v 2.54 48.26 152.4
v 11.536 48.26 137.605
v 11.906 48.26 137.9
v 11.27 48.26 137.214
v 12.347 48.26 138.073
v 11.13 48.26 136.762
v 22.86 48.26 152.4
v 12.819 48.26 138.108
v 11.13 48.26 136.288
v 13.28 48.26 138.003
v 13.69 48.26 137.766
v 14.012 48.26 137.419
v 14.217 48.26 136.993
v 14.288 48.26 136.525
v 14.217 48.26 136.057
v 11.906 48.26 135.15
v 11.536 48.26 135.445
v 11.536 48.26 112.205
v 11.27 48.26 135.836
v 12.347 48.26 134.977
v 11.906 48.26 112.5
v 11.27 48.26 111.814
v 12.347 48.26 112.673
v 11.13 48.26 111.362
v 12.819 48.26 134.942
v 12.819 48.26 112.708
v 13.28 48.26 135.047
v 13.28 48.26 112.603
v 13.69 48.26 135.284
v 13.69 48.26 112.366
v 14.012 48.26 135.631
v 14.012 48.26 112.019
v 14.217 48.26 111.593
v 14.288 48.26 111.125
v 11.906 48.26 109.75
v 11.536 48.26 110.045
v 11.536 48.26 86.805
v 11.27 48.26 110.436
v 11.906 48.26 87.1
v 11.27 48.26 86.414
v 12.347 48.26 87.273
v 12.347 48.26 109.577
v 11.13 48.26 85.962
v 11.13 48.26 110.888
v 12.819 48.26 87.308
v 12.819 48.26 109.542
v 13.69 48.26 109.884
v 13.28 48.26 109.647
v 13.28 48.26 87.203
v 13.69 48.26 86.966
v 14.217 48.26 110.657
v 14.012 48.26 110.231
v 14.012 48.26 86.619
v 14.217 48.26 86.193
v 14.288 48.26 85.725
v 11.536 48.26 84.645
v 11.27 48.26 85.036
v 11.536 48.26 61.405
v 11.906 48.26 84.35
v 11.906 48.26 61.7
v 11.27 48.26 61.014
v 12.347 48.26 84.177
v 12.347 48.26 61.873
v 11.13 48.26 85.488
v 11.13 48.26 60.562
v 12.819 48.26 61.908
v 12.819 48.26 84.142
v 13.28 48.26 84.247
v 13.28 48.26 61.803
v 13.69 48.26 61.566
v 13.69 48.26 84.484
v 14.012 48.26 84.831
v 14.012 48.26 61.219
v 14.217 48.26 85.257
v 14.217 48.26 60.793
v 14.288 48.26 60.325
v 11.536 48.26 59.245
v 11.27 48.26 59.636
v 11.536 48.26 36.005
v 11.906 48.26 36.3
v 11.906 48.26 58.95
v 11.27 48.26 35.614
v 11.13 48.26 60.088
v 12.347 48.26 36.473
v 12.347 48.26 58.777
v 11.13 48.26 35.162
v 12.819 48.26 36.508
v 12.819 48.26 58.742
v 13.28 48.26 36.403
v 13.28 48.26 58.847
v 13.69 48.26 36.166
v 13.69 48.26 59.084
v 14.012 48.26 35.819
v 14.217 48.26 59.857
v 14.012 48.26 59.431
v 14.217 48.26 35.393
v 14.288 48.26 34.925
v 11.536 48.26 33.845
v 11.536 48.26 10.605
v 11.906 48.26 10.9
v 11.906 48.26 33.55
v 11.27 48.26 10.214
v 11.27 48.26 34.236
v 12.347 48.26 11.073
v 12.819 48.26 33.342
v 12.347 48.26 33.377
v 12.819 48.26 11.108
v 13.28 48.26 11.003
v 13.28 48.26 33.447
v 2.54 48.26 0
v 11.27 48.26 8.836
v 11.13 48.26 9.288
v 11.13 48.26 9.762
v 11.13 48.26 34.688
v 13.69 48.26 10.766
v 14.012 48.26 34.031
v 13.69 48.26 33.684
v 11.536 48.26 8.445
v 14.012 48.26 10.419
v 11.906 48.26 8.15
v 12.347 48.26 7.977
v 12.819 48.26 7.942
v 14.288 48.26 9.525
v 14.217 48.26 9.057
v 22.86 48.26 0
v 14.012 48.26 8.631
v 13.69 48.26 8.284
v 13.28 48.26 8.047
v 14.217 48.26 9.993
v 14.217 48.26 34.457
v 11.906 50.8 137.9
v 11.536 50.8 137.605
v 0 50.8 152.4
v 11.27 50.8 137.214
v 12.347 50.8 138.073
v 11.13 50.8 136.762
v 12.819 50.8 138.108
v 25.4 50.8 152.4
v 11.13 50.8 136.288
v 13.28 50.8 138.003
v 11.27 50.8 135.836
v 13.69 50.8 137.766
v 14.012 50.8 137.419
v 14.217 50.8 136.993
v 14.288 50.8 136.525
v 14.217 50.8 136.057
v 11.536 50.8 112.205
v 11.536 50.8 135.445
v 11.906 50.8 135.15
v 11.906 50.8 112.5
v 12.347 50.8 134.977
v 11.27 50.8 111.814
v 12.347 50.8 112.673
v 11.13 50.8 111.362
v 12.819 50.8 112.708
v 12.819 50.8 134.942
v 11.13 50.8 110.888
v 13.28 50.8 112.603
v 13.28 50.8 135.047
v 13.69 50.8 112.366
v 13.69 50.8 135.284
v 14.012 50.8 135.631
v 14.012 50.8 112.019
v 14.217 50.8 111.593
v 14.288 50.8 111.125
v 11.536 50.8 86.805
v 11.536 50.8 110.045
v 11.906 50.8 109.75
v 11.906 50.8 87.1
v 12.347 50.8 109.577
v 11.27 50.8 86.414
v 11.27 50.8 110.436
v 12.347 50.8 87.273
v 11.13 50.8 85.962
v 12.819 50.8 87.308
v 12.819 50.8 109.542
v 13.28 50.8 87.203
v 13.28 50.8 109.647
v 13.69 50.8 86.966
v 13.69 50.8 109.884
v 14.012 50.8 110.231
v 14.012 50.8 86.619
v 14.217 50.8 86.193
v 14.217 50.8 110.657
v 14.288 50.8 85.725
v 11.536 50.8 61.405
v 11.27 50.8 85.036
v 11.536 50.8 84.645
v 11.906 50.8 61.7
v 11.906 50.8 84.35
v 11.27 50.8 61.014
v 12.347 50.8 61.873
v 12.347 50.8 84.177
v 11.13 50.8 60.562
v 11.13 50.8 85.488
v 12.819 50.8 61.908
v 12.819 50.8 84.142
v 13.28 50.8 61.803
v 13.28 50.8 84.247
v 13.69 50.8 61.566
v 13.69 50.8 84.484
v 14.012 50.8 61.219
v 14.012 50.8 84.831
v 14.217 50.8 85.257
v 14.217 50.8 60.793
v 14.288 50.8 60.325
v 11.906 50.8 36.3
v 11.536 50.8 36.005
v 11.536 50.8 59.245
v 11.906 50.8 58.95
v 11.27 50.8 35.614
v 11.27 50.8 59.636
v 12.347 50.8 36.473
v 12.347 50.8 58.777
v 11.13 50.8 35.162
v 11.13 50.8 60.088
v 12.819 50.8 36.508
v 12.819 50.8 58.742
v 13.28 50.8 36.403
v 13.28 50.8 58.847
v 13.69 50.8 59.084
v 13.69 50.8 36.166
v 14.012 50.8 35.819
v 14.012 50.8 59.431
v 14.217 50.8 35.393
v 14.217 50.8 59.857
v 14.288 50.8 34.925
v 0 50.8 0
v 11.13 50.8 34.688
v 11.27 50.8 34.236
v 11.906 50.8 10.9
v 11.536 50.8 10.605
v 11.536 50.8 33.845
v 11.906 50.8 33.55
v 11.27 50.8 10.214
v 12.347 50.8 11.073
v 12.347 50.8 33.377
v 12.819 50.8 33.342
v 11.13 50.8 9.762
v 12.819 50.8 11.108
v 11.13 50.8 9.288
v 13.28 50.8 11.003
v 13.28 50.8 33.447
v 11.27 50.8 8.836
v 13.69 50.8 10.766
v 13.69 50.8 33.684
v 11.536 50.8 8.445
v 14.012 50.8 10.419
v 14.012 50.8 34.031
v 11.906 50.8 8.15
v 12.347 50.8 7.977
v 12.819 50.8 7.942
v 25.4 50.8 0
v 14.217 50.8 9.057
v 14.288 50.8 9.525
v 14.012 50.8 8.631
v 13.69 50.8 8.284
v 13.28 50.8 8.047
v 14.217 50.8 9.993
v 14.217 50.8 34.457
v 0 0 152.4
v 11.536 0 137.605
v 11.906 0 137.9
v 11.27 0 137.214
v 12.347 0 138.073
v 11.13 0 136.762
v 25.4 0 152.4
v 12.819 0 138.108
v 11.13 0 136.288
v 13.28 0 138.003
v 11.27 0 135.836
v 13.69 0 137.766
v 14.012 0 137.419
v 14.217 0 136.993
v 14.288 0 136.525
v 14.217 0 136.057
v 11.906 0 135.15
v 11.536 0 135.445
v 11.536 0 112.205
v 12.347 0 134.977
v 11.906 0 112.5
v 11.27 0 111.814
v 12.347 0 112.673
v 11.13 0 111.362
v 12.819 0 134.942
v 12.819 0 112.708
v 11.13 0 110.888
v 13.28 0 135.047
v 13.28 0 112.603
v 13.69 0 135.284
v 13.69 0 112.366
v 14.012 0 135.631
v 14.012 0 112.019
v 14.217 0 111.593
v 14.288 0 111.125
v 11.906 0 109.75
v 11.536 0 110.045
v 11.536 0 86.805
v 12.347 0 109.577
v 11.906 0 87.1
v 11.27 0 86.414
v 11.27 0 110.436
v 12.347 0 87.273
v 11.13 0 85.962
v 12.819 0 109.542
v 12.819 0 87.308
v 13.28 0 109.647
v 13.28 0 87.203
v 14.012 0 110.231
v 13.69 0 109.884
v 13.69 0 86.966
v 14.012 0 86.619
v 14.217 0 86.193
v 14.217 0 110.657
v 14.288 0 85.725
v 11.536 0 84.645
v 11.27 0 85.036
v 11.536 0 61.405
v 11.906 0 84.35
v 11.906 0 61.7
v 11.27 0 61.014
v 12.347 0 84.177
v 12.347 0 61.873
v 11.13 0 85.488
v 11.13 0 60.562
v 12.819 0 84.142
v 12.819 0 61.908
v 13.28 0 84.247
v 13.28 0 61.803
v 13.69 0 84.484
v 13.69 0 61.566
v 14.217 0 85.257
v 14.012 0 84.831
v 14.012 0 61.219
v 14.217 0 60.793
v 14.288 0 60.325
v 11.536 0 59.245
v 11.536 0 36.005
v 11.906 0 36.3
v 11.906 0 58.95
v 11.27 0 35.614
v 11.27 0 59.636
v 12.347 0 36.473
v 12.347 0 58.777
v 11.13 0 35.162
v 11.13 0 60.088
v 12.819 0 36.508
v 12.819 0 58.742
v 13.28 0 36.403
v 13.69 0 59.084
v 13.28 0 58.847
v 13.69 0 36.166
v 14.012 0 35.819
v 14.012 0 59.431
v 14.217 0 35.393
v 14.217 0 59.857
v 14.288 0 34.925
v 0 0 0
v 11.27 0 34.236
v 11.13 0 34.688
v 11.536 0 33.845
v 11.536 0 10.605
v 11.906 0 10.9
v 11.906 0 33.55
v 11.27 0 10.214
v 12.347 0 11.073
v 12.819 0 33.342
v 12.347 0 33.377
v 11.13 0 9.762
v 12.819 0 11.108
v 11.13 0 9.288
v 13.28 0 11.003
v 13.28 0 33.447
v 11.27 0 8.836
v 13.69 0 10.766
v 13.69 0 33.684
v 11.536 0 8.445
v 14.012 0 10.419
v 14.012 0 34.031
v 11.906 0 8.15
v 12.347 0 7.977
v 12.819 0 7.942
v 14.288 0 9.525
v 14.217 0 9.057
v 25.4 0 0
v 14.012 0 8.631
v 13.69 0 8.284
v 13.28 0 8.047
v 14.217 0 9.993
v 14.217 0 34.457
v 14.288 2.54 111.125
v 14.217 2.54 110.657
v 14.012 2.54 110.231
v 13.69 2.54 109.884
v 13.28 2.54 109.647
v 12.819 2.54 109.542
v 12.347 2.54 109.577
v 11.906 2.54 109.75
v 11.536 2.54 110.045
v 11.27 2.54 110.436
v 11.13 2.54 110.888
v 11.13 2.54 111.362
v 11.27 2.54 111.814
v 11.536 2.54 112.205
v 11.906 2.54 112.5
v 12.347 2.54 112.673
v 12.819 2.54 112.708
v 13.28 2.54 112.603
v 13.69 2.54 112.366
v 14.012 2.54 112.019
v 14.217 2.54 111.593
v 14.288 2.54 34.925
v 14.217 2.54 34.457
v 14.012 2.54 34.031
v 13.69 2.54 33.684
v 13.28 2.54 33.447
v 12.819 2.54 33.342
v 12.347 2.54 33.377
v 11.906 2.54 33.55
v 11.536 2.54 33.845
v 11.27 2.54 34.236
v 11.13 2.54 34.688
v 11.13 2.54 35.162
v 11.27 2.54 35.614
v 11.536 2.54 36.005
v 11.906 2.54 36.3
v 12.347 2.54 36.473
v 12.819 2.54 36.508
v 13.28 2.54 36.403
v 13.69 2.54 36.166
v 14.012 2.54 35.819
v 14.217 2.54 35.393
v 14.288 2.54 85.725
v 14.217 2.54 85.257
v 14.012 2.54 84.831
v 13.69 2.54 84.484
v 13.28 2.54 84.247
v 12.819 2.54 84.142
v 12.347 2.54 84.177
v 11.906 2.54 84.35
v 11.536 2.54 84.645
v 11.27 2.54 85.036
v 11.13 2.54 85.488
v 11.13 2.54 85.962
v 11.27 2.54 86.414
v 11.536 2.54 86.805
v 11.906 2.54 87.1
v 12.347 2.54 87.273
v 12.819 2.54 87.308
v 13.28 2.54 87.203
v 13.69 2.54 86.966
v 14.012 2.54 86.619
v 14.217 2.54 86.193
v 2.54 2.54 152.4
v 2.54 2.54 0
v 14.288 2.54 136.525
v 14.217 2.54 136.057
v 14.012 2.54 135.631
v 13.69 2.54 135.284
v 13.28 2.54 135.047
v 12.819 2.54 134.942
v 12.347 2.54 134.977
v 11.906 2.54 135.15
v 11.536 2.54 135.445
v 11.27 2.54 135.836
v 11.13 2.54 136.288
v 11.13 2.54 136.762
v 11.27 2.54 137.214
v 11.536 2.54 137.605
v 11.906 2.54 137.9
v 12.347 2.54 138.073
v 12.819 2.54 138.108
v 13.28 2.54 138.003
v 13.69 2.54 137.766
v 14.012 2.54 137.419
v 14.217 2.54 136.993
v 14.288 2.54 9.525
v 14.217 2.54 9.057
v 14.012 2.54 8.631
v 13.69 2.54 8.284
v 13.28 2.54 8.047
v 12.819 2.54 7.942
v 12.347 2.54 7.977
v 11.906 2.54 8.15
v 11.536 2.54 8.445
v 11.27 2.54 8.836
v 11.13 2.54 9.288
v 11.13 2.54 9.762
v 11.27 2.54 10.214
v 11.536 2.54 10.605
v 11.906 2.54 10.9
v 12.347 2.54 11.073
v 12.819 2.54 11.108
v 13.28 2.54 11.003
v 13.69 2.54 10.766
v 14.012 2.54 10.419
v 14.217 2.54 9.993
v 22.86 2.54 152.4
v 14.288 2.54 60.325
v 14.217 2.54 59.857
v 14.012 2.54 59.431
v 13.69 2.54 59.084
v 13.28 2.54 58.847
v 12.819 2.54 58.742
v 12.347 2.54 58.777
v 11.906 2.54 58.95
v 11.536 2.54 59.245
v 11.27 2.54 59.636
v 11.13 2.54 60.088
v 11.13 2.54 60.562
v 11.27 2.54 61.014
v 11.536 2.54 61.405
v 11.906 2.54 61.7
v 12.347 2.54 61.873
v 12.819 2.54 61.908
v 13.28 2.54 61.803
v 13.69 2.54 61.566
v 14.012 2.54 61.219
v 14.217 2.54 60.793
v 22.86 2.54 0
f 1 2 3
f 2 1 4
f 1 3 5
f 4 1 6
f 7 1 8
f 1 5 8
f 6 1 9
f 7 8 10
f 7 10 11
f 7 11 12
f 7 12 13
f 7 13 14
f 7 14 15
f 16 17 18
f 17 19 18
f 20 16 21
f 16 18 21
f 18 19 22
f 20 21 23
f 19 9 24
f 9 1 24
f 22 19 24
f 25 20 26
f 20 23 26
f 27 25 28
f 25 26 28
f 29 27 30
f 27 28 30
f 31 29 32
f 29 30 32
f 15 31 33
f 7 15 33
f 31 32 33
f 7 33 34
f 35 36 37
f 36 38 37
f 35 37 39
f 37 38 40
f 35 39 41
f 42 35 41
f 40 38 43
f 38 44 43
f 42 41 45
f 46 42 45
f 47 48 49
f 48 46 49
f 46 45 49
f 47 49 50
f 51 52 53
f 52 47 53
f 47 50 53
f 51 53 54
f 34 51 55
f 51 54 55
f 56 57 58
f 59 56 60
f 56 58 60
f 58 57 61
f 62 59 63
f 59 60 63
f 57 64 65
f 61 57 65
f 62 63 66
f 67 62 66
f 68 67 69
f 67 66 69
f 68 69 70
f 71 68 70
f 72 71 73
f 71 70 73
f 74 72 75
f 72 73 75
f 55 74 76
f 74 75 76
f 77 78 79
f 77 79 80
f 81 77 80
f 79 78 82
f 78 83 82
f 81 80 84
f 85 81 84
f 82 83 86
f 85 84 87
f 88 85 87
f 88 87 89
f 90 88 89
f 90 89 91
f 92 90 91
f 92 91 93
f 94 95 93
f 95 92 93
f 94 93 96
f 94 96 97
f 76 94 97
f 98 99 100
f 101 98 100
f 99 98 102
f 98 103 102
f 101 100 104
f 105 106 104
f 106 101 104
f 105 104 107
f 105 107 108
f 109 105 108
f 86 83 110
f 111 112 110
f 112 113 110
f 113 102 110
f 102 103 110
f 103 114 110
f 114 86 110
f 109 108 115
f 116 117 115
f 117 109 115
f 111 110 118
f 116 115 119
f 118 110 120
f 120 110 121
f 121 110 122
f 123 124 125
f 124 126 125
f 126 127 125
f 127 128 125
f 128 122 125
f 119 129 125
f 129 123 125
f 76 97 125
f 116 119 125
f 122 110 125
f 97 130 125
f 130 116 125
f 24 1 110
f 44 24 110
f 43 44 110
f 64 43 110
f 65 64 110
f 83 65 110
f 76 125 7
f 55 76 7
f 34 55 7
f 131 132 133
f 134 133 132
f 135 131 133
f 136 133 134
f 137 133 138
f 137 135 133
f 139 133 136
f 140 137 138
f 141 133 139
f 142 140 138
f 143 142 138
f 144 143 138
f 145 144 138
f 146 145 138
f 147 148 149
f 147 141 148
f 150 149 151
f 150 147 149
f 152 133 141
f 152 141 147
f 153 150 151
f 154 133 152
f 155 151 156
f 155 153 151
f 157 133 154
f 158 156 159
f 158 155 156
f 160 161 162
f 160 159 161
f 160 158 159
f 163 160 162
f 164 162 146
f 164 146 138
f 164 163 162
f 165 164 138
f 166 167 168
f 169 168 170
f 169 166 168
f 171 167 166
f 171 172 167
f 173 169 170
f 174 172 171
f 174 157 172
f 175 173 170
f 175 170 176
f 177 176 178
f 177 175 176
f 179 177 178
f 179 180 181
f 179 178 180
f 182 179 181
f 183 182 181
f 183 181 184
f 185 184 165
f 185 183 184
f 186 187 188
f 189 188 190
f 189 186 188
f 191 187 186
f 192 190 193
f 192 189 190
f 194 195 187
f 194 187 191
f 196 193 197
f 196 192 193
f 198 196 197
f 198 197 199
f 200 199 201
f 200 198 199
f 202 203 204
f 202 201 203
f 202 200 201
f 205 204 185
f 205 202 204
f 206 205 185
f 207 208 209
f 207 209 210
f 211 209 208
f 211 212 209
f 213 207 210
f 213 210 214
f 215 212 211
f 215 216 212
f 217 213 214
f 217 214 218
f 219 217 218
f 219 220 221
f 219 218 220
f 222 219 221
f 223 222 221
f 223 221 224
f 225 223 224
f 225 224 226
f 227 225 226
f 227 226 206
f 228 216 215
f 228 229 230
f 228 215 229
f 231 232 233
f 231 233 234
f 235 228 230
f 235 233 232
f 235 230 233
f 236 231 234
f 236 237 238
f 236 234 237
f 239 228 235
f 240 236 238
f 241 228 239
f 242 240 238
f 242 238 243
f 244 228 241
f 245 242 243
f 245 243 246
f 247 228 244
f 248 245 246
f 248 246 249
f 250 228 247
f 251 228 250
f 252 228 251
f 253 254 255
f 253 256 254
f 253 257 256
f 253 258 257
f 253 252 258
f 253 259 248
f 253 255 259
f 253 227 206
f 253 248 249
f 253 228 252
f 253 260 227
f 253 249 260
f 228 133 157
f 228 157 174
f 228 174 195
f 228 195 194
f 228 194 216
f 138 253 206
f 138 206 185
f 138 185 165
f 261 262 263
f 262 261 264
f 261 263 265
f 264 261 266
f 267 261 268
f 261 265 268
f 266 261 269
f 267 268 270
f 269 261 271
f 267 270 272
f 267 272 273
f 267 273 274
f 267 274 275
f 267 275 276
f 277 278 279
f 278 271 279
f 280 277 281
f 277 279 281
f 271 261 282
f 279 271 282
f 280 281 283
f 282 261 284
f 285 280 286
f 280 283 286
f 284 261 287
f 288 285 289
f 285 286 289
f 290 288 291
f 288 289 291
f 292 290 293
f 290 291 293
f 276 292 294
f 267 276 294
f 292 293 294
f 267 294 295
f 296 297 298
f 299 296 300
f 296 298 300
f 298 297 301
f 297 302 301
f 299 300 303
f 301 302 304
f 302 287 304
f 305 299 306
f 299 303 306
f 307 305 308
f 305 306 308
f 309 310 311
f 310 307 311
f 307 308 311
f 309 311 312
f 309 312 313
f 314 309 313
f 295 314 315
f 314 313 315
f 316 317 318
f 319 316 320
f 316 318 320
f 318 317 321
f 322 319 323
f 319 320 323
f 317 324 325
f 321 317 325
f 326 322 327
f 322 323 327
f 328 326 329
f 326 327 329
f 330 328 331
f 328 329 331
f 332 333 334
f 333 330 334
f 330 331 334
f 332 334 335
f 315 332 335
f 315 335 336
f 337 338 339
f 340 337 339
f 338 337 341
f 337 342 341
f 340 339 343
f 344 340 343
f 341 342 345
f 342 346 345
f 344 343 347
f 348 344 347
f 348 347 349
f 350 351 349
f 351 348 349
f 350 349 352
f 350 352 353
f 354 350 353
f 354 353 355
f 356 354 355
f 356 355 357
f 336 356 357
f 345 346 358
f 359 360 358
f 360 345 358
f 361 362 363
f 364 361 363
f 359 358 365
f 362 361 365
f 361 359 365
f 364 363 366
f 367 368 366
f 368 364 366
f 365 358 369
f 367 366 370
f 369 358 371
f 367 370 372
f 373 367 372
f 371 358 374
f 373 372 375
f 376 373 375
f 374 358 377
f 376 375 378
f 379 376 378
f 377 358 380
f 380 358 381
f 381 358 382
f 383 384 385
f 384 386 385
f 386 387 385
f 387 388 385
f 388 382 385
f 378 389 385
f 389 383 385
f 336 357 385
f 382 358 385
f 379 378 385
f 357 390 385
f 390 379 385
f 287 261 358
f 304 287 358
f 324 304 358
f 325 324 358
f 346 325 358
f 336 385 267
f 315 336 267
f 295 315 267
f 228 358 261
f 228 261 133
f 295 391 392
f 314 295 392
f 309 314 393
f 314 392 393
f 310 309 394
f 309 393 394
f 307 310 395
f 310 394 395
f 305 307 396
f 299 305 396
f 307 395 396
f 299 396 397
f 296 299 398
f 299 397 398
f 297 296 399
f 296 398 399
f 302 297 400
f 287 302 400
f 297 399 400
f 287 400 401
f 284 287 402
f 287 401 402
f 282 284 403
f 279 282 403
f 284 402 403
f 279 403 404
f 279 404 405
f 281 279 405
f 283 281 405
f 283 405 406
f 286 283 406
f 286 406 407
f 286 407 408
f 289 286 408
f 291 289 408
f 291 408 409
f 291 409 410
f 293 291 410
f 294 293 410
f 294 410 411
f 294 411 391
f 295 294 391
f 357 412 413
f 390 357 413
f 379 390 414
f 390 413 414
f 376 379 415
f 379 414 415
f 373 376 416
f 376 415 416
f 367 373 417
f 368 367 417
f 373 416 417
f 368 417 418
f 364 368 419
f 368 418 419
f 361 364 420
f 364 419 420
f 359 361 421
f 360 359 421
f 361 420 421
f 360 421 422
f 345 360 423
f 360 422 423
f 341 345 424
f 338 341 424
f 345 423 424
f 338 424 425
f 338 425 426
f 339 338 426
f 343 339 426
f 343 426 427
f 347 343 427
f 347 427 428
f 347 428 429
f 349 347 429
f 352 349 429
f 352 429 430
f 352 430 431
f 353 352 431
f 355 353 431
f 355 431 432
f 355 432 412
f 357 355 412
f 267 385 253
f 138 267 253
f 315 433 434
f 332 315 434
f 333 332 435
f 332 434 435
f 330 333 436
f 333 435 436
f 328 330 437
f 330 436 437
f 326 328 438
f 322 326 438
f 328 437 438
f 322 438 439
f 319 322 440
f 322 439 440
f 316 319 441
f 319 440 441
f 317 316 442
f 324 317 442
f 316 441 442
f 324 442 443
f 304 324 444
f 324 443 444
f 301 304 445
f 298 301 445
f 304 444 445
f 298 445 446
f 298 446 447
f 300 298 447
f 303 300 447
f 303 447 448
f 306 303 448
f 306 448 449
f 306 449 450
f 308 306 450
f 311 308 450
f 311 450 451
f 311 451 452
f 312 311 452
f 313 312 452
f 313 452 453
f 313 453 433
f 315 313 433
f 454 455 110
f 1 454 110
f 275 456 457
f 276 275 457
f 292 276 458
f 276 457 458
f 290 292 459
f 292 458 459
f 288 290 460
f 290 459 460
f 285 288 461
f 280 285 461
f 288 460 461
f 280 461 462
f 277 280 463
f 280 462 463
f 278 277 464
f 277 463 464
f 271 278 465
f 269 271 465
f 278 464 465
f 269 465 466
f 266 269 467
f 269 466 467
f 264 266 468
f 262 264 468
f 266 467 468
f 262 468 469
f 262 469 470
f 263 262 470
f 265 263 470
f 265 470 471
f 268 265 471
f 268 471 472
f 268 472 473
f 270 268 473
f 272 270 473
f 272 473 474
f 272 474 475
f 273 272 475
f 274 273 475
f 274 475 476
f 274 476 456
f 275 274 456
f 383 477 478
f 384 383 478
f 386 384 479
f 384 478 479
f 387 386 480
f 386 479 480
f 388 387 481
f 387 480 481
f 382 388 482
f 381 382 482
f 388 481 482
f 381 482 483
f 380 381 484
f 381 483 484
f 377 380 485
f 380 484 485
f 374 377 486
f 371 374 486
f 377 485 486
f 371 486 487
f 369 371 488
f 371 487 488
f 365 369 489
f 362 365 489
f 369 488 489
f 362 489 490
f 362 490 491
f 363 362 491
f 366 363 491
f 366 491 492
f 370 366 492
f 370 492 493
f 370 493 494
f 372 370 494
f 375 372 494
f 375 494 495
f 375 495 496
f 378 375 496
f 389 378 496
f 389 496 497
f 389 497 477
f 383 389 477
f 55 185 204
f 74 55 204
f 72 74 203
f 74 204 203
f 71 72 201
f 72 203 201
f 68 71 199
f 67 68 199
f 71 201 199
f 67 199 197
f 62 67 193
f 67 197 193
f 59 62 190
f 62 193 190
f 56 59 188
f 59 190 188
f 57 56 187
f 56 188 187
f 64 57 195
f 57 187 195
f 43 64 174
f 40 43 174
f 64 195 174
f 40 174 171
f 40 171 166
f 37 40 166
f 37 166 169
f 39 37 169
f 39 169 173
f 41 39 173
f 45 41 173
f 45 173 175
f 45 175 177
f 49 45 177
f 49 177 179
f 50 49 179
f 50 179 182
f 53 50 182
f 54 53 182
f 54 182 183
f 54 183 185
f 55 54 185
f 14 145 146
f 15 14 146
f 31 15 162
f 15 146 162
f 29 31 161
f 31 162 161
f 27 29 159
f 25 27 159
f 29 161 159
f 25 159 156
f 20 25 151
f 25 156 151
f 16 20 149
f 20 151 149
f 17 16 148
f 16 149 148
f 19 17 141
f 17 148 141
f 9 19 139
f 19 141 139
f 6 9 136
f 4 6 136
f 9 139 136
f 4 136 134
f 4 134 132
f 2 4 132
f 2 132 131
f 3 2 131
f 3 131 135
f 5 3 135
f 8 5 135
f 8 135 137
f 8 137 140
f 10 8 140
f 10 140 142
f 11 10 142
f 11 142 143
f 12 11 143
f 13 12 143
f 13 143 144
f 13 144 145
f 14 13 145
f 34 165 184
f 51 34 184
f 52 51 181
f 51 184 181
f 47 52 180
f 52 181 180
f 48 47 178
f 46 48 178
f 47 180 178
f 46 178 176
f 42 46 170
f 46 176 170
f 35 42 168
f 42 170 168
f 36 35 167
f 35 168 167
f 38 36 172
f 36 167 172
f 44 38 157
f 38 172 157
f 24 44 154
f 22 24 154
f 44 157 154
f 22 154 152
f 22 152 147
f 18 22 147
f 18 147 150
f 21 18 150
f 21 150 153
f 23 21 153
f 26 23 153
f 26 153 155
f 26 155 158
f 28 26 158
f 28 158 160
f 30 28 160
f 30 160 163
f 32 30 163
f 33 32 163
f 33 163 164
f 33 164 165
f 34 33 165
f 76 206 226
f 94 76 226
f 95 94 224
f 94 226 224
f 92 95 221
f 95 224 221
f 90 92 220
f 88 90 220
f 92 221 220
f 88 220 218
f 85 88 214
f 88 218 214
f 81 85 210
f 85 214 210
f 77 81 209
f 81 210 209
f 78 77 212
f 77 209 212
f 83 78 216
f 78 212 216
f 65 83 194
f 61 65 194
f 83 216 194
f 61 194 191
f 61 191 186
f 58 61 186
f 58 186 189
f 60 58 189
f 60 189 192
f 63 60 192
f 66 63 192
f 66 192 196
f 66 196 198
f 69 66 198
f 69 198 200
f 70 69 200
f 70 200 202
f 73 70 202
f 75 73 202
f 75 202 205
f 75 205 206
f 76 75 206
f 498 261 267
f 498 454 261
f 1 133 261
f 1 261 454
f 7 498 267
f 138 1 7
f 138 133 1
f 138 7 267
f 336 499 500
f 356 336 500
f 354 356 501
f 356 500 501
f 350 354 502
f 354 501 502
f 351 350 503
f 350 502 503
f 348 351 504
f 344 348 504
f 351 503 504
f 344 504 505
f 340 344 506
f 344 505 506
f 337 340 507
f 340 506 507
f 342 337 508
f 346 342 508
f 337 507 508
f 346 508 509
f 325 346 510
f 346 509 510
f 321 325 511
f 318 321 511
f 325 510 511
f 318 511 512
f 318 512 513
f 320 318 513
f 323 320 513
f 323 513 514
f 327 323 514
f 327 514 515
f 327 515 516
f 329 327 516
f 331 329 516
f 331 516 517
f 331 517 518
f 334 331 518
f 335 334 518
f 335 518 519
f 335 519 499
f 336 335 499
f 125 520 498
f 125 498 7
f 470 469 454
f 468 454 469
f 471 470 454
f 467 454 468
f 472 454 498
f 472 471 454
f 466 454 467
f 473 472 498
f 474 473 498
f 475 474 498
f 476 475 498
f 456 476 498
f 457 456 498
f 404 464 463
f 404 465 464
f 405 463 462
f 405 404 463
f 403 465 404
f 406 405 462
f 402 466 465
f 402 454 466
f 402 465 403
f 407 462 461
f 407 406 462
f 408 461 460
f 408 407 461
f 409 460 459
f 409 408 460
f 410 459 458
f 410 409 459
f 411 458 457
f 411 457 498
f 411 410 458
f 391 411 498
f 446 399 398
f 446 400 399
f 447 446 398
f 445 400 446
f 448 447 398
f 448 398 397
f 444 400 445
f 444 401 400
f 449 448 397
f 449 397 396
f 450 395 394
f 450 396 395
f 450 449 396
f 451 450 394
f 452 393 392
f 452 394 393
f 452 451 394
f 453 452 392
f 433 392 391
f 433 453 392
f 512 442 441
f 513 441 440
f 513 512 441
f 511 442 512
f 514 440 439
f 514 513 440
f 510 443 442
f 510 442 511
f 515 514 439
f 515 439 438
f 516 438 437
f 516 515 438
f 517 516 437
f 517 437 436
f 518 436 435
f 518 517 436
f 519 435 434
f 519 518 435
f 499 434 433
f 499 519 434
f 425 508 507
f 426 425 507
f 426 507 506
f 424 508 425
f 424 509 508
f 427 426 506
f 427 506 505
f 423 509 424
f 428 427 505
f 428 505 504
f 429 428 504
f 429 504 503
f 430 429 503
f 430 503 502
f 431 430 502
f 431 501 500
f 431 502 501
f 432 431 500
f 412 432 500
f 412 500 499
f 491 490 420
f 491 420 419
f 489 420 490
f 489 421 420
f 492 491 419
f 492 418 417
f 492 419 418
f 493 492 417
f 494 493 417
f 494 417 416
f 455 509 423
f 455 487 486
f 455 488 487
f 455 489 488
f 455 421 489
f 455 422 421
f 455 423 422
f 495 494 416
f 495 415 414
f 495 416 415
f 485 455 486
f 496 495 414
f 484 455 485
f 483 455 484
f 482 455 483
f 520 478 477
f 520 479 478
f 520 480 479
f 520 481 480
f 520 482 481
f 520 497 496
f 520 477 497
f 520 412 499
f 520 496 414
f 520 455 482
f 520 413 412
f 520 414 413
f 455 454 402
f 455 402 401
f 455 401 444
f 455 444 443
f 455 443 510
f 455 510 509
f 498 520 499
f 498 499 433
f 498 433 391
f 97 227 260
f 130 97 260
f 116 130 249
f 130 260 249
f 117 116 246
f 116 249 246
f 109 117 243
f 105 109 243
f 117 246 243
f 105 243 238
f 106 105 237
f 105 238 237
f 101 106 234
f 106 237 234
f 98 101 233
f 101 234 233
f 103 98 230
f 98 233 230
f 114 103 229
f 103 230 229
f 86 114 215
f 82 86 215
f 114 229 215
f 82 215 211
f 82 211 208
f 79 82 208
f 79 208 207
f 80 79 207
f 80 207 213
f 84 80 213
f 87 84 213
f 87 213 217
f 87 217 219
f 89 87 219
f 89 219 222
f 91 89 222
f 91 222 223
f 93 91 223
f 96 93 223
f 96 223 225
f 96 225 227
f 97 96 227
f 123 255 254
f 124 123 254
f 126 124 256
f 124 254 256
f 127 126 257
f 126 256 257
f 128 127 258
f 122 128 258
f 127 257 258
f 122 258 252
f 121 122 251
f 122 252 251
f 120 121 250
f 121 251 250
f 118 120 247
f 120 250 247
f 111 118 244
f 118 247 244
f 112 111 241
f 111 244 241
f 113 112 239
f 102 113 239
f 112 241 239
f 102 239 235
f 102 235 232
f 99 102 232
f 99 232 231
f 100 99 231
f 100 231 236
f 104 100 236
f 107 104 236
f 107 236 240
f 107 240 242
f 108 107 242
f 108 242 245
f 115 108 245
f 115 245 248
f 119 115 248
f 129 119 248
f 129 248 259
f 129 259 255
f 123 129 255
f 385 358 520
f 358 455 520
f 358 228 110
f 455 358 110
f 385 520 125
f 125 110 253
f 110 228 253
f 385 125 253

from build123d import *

# Parameters (mm, degrees)
SKETCH1_W           = 25.4
SKETCH1_H           = 50.8
SKETCH1_W_2         = 20.32
SKETCH1_H_2         = 45.72
EXTRUDE_THIN1_DEPTH = 152.4
SKETCH2_R           = 1.5875
CUT_EXTRUDE1_DEPTH  = 51.8
LPATTERN1_COUNT     = 50
LPATTERN1_PITCH     = 25.4


with BuildPart() as part:
    # Sketch1 → Extrude-Thin1 (new body)
    with BuildSketch(Plane.XY):
        with Locations((12.7, 25.4)):
            Rectangle(SKETCH1_W, SKETCH1_H)
        with Locations((12.7, 25.4)):
            Rectangle(SKETCH1_W_2, SKETCH1_H_2, mode=Mode.SUBTRACT)
    extrude(amount=EXTRUDE_THIN1_DEPTH)

    # Sketch2 → Cut-Extrude1 (cut, through all)
    with BuildSketch(Plane(origin=(0, 50.8, 0), x_dir=(1, 0, 0), z_dir=(0, 1, 0))):
        with Locations((12.7, -136.525)):
            Circle(SKETCH2_R)
    cut_extrude1 = extrude(amount=-CUT_EXTRUDE1_DEPTH, mode=Mode.SUBTRACT)

    # LPattern1: Cut-Extrude1 ×50
    with Locations(*[(0, 0, -i * LPATTERN1_PITCH) for i in range(1, LPATTERN1_COUNT)]):
        add(cut_extrude1, mode=Mode.SUBTRACT)


solid = part.part
